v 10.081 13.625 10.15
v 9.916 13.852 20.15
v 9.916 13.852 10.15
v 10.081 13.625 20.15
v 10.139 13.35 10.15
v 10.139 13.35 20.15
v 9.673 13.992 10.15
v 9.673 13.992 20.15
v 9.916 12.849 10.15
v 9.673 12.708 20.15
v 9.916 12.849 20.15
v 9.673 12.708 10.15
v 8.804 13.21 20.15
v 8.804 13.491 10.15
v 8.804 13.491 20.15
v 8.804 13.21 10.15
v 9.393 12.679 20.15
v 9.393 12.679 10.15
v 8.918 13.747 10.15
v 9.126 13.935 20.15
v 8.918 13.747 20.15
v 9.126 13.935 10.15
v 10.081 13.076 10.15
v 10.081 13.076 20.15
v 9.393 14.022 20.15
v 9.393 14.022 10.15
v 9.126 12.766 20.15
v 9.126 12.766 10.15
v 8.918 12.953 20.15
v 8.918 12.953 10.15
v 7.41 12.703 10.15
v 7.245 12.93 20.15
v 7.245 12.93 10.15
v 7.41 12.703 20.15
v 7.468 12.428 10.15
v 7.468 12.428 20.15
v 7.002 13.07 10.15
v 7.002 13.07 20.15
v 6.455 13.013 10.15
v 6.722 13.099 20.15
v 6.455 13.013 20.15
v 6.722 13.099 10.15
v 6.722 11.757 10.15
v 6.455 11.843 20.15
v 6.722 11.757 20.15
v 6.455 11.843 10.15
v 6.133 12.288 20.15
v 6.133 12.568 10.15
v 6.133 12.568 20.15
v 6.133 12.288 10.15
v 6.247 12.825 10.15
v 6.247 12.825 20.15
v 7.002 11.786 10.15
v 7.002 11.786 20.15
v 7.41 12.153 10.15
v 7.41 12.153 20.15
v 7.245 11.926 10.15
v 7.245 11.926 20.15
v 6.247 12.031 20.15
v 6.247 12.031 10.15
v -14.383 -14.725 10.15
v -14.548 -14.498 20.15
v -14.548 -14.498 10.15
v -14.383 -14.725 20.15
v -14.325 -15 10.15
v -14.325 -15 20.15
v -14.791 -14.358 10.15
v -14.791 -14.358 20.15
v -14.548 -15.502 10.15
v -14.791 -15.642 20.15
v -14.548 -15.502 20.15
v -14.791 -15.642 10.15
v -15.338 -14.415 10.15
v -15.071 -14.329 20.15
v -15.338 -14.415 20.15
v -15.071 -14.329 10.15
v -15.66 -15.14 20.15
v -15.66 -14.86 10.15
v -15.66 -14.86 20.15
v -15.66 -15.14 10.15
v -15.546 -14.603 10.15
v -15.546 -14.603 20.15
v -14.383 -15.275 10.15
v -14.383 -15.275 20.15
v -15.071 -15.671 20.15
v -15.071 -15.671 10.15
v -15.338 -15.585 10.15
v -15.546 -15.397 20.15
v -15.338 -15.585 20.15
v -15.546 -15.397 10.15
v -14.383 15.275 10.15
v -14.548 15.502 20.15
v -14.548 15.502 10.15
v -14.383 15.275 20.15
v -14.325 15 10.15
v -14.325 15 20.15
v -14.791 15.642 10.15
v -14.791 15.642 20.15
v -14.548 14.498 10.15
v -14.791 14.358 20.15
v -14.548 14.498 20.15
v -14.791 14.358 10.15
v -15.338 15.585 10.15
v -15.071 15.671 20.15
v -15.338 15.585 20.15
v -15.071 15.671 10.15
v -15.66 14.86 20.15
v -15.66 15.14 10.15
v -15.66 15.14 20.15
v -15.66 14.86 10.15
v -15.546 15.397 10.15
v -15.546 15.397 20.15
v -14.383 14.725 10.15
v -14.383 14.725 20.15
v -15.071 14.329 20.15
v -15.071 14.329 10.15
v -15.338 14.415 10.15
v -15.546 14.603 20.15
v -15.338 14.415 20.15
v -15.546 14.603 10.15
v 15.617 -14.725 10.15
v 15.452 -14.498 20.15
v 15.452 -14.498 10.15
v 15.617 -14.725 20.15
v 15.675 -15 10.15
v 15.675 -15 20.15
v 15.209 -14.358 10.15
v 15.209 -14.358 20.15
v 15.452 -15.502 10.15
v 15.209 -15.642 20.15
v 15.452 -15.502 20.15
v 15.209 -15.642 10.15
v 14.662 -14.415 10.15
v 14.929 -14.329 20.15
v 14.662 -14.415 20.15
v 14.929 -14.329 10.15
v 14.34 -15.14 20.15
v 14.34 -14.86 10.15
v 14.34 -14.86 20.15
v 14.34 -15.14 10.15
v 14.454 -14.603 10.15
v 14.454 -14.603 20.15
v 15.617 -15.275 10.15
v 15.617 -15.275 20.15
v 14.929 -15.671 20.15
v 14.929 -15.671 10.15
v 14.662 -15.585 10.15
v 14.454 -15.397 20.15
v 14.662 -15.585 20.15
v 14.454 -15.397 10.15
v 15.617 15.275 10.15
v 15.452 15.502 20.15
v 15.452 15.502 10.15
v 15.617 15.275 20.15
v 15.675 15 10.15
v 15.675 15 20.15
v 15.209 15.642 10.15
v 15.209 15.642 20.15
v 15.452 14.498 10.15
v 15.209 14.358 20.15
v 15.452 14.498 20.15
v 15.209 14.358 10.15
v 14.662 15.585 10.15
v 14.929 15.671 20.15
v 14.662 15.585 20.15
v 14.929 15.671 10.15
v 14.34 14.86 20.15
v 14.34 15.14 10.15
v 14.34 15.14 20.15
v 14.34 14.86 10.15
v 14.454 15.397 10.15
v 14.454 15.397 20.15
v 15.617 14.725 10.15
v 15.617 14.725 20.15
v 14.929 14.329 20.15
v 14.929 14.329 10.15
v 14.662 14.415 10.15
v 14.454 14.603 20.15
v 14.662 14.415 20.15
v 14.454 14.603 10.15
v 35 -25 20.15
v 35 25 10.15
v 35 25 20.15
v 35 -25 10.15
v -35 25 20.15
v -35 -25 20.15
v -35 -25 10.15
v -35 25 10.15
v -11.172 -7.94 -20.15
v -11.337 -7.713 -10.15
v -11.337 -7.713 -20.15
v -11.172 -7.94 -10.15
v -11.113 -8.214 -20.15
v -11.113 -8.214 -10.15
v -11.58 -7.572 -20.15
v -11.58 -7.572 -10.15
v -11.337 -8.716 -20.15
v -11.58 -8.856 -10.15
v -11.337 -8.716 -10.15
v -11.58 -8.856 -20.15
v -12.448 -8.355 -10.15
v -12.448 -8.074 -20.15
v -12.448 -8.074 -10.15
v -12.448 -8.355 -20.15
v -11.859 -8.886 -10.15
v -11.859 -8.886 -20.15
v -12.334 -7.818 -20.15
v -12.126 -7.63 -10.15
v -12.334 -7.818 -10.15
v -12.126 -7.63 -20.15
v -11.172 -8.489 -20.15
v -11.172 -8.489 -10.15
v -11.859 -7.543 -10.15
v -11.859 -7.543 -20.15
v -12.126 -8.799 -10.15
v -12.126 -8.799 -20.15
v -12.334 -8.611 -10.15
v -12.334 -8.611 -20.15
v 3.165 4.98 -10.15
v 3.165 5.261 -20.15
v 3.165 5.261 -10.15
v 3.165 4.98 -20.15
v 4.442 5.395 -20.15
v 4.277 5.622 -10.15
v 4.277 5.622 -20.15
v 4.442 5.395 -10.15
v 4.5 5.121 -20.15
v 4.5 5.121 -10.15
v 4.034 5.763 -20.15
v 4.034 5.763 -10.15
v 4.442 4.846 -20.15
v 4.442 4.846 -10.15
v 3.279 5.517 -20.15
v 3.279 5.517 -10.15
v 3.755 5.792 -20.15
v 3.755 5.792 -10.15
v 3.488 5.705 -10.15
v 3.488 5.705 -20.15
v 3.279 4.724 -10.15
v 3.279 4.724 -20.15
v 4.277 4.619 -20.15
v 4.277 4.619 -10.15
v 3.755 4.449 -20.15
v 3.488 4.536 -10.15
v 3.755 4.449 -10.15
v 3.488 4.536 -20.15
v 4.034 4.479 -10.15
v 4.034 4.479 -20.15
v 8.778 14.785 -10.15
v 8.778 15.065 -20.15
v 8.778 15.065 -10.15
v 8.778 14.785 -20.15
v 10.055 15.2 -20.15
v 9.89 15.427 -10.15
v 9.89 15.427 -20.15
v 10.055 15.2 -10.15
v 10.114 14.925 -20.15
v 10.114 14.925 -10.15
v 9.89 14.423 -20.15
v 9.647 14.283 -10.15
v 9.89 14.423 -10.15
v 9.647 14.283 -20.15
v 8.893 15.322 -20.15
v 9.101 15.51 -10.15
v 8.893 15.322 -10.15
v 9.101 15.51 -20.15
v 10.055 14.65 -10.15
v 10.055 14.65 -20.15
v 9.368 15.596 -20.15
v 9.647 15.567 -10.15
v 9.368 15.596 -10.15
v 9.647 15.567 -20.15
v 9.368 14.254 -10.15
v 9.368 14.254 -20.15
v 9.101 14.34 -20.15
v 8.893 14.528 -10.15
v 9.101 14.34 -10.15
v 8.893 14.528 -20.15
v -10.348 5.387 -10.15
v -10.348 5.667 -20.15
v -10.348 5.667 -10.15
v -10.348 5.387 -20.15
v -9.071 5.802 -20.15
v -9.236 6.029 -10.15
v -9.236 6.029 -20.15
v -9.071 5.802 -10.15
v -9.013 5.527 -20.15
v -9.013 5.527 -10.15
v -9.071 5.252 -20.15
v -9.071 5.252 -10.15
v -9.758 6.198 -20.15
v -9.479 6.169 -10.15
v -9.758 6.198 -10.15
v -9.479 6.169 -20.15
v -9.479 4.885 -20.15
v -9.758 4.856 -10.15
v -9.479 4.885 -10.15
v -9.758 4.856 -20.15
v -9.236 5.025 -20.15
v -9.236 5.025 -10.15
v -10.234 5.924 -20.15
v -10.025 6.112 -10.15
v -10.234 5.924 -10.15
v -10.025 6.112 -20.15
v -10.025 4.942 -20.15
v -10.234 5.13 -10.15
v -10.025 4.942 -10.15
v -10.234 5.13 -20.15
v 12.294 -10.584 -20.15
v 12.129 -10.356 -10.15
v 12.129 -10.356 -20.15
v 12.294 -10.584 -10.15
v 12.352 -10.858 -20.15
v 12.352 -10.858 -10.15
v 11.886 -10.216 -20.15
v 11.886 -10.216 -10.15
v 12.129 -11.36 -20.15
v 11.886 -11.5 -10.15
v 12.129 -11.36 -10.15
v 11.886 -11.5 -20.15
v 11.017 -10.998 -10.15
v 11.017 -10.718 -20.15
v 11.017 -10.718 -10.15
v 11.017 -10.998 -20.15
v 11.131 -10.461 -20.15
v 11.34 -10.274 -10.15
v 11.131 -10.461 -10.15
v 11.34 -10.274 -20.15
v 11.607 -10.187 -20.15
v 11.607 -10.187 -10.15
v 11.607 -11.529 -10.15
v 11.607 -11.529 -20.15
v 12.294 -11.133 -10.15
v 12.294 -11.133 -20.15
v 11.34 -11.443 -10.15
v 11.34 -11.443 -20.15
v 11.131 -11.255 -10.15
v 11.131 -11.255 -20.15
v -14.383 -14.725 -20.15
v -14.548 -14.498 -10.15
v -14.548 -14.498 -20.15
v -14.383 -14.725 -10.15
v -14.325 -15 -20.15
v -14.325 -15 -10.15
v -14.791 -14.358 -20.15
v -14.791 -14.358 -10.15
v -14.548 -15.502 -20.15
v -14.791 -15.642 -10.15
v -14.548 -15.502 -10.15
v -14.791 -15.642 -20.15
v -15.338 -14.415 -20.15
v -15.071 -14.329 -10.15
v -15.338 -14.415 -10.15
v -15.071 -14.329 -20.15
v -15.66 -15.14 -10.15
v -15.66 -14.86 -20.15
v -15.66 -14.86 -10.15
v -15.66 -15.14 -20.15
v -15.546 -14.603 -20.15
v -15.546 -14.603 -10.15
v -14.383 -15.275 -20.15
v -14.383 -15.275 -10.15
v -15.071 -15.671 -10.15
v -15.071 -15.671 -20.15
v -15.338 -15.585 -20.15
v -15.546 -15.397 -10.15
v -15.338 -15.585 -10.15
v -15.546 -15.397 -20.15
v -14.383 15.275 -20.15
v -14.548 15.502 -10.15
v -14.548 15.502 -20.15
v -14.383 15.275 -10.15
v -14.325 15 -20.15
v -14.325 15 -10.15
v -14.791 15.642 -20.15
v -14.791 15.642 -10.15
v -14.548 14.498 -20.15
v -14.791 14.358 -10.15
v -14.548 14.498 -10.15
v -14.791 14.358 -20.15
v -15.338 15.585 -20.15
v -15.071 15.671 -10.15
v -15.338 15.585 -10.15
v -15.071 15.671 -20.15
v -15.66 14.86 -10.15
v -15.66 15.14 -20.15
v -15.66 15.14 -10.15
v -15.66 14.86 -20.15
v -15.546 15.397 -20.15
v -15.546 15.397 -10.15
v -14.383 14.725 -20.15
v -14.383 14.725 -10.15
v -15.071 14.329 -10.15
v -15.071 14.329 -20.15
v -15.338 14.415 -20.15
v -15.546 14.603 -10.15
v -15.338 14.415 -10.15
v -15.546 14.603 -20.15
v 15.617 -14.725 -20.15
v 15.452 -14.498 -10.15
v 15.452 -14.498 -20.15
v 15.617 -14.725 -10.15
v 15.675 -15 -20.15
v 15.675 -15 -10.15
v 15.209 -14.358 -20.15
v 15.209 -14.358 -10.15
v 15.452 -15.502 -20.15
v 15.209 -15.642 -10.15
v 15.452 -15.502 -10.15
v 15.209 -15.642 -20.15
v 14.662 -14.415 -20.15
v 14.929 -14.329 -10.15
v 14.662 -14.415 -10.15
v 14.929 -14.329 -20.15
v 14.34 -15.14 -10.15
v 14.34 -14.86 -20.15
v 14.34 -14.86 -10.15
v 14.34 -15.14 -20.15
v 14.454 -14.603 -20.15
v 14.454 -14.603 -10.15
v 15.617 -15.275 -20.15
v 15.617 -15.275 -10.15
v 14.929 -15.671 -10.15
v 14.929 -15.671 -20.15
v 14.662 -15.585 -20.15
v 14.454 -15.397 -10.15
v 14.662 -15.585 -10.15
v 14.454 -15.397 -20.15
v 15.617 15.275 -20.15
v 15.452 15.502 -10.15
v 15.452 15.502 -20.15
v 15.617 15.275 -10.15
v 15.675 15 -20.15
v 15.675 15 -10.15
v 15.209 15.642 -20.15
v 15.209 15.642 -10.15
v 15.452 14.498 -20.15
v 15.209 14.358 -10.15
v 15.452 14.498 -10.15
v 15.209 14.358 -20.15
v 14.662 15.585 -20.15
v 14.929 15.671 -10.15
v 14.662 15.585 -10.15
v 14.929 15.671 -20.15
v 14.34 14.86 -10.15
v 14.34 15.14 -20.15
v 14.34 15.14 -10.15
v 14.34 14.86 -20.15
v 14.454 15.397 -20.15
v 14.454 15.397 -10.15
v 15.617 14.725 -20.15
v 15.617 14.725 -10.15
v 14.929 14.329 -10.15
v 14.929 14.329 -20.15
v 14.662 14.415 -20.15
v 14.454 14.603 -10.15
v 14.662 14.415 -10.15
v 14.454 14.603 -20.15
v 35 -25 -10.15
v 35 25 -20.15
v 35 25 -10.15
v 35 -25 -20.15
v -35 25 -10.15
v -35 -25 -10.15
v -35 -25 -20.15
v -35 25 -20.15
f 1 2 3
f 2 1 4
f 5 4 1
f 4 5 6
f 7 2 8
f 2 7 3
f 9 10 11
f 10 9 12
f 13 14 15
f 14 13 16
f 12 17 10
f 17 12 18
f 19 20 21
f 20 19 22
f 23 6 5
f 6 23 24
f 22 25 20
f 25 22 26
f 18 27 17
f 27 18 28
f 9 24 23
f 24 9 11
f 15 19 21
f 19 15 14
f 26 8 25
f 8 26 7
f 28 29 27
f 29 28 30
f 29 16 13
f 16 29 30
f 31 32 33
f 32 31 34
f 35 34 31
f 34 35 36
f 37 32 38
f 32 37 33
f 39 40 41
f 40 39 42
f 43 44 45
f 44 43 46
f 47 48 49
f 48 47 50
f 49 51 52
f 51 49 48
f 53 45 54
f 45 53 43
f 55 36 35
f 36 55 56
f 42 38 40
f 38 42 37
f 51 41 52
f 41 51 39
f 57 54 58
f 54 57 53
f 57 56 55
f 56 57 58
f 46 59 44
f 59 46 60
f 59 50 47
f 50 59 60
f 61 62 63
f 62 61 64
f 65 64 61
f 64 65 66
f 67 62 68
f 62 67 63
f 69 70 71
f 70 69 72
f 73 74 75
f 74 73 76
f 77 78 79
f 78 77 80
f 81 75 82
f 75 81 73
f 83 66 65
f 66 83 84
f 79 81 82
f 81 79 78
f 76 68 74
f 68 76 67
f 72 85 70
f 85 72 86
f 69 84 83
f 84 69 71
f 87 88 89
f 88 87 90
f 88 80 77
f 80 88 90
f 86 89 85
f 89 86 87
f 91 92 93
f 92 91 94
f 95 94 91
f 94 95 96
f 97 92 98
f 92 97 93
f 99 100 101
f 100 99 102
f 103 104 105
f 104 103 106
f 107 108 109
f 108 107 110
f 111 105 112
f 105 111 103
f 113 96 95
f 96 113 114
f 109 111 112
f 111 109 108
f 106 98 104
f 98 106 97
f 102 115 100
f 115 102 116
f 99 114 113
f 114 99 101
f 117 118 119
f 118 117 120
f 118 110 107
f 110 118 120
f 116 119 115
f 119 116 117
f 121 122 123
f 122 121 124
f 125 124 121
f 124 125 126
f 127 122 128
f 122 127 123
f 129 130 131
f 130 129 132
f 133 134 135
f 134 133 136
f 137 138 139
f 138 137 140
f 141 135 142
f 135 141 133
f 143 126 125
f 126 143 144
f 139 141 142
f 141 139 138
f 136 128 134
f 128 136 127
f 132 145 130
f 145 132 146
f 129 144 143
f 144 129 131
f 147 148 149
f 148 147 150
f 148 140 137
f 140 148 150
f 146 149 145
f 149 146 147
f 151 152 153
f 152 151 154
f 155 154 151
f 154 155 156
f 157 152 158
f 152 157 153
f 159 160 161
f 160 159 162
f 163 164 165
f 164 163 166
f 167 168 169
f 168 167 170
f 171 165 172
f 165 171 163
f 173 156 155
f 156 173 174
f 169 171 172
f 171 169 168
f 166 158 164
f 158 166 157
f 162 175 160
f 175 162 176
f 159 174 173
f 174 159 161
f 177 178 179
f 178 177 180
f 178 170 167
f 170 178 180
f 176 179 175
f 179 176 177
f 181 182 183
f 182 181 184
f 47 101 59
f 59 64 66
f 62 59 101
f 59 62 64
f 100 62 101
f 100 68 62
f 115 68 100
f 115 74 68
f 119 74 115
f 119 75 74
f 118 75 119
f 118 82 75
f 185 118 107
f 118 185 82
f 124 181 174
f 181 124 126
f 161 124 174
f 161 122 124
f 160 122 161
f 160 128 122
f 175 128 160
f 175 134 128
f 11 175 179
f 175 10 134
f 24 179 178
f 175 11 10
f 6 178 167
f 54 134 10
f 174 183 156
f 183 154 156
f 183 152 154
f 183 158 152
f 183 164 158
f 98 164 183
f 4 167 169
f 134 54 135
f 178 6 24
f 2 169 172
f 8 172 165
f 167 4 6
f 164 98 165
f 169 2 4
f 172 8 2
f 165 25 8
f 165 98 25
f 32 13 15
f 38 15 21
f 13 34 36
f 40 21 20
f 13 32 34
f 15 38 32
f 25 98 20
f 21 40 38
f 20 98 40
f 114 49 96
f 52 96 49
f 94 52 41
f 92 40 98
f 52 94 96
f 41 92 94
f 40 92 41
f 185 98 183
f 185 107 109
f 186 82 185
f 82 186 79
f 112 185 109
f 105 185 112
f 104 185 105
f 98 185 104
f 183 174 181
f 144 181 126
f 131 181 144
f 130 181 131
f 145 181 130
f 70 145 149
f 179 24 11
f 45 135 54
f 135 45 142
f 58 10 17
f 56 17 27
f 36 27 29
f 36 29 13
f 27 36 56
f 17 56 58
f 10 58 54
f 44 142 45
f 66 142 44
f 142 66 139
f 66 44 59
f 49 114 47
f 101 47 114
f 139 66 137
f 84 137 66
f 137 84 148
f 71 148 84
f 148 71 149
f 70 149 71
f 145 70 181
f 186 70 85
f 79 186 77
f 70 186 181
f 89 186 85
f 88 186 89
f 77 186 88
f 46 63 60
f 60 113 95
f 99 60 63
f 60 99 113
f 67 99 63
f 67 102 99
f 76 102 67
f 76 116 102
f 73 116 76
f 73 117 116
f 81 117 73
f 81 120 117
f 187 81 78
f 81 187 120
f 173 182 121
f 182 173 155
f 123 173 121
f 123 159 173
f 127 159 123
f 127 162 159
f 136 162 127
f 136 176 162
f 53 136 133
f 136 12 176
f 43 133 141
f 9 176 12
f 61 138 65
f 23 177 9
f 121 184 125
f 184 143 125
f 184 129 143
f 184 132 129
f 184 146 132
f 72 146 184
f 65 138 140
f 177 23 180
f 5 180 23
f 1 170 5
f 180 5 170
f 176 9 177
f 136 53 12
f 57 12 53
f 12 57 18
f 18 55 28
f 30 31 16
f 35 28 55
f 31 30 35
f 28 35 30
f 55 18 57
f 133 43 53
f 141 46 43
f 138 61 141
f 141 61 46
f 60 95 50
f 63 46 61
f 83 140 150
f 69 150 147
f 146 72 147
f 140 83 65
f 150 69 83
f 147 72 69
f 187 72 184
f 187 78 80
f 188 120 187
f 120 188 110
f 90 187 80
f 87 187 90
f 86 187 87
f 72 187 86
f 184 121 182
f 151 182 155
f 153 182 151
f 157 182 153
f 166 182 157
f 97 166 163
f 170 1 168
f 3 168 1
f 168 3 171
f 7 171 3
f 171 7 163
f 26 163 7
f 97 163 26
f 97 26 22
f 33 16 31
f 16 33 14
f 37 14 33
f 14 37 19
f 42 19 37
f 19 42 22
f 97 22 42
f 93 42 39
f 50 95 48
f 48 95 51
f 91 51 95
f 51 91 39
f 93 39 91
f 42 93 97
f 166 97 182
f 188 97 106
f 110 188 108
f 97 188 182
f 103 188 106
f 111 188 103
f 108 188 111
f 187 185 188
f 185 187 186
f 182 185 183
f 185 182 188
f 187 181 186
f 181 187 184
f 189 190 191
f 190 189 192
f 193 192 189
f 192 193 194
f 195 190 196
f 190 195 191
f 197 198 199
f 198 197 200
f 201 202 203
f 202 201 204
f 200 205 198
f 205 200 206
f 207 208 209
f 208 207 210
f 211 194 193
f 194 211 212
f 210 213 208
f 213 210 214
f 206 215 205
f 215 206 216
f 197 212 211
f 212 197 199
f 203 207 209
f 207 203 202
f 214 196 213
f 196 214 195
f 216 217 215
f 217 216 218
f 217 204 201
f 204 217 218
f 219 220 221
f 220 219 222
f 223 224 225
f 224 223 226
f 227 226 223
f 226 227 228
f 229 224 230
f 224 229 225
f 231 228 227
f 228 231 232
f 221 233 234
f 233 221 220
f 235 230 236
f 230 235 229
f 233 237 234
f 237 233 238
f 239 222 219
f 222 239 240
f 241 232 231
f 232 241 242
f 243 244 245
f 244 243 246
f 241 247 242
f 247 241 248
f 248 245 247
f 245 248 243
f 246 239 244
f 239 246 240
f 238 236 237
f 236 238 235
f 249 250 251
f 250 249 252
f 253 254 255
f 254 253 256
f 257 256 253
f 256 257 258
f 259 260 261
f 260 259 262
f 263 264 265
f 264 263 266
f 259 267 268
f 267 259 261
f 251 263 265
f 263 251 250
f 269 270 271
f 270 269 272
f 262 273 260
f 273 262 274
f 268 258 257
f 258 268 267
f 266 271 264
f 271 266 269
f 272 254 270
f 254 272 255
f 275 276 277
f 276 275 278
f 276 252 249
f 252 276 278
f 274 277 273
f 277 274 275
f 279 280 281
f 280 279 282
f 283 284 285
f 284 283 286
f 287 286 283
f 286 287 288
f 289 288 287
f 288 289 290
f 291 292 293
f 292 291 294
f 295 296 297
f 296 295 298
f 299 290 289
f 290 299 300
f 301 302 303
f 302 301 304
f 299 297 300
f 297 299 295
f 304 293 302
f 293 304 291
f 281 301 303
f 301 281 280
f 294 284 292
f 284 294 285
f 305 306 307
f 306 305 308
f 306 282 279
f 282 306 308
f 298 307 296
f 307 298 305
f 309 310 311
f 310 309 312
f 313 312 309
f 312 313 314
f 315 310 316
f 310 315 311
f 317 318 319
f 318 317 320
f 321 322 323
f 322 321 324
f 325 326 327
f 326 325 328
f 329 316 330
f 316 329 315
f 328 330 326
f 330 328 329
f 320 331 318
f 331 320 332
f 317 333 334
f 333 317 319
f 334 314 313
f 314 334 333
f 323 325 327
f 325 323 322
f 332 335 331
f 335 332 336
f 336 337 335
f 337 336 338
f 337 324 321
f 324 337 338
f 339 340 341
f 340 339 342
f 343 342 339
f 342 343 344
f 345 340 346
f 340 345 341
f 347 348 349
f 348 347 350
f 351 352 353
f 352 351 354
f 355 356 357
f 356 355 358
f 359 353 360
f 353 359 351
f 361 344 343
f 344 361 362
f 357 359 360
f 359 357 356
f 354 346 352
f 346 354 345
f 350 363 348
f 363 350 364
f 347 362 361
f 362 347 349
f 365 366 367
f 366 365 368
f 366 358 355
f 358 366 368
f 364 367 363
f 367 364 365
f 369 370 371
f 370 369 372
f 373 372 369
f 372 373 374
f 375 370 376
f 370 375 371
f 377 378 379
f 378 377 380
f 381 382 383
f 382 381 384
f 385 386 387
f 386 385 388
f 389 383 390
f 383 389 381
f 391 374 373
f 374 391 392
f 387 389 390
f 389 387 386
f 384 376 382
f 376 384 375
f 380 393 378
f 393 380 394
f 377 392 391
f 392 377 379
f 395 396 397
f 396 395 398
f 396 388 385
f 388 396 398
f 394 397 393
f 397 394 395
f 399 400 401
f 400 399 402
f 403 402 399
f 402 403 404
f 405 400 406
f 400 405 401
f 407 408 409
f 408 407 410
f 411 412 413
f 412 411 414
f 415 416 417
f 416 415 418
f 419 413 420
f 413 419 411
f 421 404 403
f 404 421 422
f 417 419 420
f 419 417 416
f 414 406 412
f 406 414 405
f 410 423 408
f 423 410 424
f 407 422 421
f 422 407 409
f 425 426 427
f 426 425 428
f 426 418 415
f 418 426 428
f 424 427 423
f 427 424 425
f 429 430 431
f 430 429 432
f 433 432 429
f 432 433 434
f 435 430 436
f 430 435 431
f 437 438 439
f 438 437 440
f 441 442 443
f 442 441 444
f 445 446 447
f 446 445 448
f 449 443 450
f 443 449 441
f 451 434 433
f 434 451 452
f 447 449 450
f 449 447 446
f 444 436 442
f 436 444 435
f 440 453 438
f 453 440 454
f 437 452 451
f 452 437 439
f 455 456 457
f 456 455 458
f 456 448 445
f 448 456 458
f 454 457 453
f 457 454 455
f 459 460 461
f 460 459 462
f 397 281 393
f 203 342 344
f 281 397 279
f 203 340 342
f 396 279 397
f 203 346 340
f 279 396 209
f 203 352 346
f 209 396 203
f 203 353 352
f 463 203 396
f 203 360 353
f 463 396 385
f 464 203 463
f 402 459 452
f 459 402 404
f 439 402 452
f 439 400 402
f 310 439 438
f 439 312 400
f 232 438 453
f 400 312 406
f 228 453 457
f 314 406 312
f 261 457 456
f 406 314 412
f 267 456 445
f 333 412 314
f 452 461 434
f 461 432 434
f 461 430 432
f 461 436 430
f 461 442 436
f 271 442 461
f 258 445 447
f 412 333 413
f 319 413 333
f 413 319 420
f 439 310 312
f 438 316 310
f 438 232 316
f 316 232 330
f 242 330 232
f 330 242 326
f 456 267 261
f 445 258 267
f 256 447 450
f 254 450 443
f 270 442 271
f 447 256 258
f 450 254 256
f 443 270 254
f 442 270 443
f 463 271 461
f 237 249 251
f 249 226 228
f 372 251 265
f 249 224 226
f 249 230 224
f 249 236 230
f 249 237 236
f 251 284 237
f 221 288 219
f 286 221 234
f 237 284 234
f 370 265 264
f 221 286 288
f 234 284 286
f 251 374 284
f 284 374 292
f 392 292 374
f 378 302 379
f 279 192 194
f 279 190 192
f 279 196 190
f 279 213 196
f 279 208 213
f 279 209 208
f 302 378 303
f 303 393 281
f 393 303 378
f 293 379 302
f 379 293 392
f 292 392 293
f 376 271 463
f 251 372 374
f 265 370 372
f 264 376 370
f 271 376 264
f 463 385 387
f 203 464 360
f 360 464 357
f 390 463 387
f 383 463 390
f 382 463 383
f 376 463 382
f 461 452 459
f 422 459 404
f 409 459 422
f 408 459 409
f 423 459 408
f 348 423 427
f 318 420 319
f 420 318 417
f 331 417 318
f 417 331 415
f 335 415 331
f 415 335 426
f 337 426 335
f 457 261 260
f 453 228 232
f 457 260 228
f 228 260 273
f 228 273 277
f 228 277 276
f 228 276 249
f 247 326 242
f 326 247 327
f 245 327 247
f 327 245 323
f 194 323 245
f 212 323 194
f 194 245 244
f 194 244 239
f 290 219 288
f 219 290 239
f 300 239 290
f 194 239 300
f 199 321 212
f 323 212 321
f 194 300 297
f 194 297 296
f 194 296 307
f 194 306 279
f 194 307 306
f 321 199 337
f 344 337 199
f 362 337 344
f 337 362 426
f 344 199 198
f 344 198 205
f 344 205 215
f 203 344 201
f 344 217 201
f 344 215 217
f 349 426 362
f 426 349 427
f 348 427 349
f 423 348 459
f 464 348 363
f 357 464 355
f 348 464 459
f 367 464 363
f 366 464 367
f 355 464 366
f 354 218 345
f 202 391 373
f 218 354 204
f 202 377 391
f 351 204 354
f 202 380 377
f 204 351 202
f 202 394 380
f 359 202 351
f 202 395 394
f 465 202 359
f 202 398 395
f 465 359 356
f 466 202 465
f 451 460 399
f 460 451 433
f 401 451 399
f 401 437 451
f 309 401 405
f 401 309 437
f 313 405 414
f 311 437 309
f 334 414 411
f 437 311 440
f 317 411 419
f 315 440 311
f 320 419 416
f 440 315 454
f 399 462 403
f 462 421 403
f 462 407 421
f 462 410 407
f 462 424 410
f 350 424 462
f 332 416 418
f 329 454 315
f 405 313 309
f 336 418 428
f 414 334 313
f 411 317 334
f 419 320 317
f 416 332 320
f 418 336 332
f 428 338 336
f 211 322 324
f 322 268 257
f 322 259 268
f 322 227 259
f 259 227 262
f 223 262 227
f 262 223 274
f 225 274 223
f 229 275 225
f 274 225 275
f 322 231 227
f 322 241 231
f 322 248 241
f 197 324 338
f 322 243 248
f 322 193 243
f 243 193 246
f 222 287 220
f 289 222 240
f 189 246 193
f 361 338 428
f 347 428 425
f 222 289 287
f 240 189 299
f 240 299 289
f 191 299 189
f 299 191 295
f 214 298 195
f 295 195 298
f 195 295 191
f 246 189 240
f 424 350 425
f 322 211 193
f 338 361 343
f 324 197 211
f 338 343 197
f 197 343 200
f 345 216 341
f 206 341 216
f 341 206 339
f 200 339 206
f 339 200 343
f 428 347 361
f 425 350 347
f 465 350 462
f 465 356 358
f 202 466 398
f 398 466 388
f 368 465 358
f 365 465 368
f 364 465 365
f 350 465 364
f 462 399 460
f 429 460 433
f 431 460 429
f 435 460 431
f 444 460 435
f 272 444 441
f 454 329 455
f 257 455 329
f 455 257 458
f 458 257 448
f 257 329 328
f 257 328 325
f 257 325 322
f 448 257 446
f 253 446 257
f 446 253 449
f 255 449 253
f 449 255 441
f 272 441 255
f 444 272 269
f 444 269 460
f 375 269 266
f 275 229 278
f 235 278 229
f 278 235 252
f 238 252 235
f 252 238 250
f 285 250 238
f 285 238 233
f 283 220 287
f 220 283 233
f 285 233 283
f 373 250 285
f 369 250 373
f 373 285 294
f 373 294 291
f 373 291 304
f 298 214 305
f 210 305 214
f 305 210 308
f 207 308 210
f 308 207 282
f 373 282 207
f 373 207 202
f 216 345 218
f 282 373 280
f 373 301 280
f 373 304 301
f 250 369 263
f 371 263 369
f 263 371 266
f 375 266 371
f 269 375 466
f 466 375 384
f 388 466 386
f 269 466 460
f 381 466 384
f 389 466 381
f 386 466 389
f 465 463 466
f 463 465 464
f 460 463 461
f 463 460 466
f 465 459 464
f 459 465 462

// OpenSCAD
/*  This program is free software: you can redistribute it and/or modify
    it under the terms of the GNU General Public License as published by
    the Free Software Foundation, either version 3 of the License, or
    (at your option) any later version.

    This program is distributed in the hope that it will be useful,
    but WITHOUT ANY WARRANTY; without even the implied warranty of
    MERCHANTABILITY or FITNESS FOR A PARTICULAR PURPOSE.  See the
    GNU General Public License for more details.

    You should have received a copy of the GNU General Public License
    along with this program. If not, see <https://www.gnu.org/licenses/>.   
*/

/*
An OpenSCAD script to convert a csv file containing a pcb test point report - generated e.g. from Altium Designer, KiCAD, Eagle or any other PCB design software - into a 3D model of a holder for mounting test probes for electrical tests.

Documentation and the latest version of this script can be found at: https://github.com/5inf/TestPointReport2STL

*/

//////////////////////////////////////////////////////////
//////////////// CONFIGURE BELOW//////////////////////////
//////////////////////////////////////////////////////////

//data of testpoints
/* [test point data] */
testpointdata=[
/* paste testpoint data here */
["GND", "T13-1", [8.2118,11.7856,0], "Bottom", 0, "075-PRP259RS-S", "075-SDN250S"],
["+5.0V", "T1-1", [23.8252,25.1206,0], "Bottom", 0, "075-PRP259RS-S", "075-SDN250S"],
["NetJ1_1", "T2-1", [29.4386,34.925,0], "Bottom", 0, "075-PRP259RS-S", "075-SDN250S"],
["GND", "T3-1", [10.3124,25.527,0], "Bottom", 0, "075-PRP259RS-S", "075-SDN250S"],
["SDA", "T4-1", [29.464,33.3502,0], "Top", 0, "075-PRP259RS-S", "075-SDN250S"],
["SCL", "T5-1", [26.793,32.428,0], "Top", 0, "075-PRP259RS-S", "075-SDN250S"],
["-5.0V", "T6-1", [31.6774,9.1419,0], "Bottom", 0, "075-PRP259RS-S", "075-SDN250S"],
["", "M4", [5,5,0], "Both", 0, "", ""],
["", "M3", [5,35,0], "Both", 0, "", ""],
["", "M2", [35,5,0], "Both", 0, "", ""],
["", "M1", [35,35,0], "Both", 0, "", ""]
/* end of paste testpoint data here */
];

//Parameters for the simple rectangular testpoint holder block
/* [Simple] */
//build fixture for needles for top testpoints
buildtop=true; 
//build fixture for needles for top testpoints
buildbottom=true; 
//extra width of mounting sheet in x direction
borderx=20;         
//extra width of mounting sheet in y direction
bordery=10;         
//thickness of mounting block holding the test probes
sheetthickness=10;

//Advanced model generation
/* [Visual] */
//show the actual testpins
showpins=false; 
//the initial distance of the pins from the surface of the pcb
initialpindistance=1; 

//Generate mounting plates
drawmountingsystem=false;  

//include a second holder for the pcb top side
includetoppcbholder=false;

//load a pcb 3d model specified by pcb path below
showpcb = false;    
//path to loadable pcb file (note: OpenSCAD supports stl format only)
pcbpath="";         
//show a dummy pcb model
showpcbdummy = false; 
//show the test pad locations on the dummy pcb as a simple cylinder shape
showtestpads = false; //show the test pad locations on the dummy pcb as a simple cylinder shape
//thickness of the (dummy) PCB
pcbthickness=1.6;   

//Animation options
/* [Animation] */
//distance of movement of the pcb under test towards the bottom holder. The top holder moves twice as far.
movementdistance=5; 

/* [Hidden] */
//Data specific to the default QATech.com 075-SDN250S/075-PRP259RS-S test needles 
//minimum distance of test needle tip from where it is mounted
minpointheight=0;  
//maximum distance of test needle tip from where it is mounted
maxpointheight=6.35;  

//////////////////////////////////////////////////////////
/////////////// DO NOT EDIT BELOW ////////////////////////
//////////////////////////////////////////////////////////

timeoffset=initialpindistance/movementdistance;

span=maxpointheight-minpointheight;

pointstop=[for(v=testpointdata)if(v[3]!="Bottom")v];
//echo(pointstop);

pointsbottom=[for(v=testpointdata)if(v[3]!="Top")v];
//echo(pointsbottom);

maxx=max([for(v=testpointdata)v[2][0]]);
minx=min([for(v=testpointdata)v[2][0]]);
maxy=max([for(v=testpointdata)v[2][1]]);
miny=min([for(v=testpointdata)v[2][1]]);

maxtop=max([for(v=pointstop)v[2][2]]);
mintop=min([for(v=pointstop)v[2][2]]);
maxbottom=max([for(v=pointsbottom)v[2][2]]);
minbottom=min([for(v=pointsbottom)v[2][2]]);

maxdisttop=maxtop-mintop;
maxdistbottom=maxbottom-minbottom;

if(movementdistance>initialpindistance+span){
    echo ("ERROR: moving to far. Pins and setup might get damaged!");
}
if(movementdistance<initialpindistance+maxdisttop){
    echo ("ERROR: moving not far enough. Top pins might not all connect!");
}
if(movementdistance<initialpindistance+maxdistbottom){
    echo ("ERROR: moving not far enough. Bottom pins might not all connect!");
}

if(drawmountingsystem){
    //draw top block with interconnect pcb

    translate([0,0,0]){
        //WAMMountingTop(zpos=maxtop+span+2);
    }
    //draw top bcb holder (this holder is optional as one option to hold down the pcb.)
    if(includetoppcbholder){
    translate([0,0,0]){
        WAMMountingMiddle(zpos=+(-1.6+5)/2);
    }
}
    //draw bottom pcb holder
    translate([0,0,0]){
        WAMMountingMiddle(zpos=-(1.6+5)/2);
    }
    //draw bottom block with interconnect pcb
    //WAMMountingBottom(zpos=-maxbottom-span-9,movementdistance=movementdistance);
}


//center testpoints arround origin
translate([-(minx+maxx)/2,-(maxy+miny)/2,0]){
    
    //dummy PCB
    translate([0,0,0]){
        if(showpcbdummy){
            translate([minx-5,miny-5,-pcbthickness/2]){
                    color("Green",alpha=0.4)
                    cube([maxx-minx+10,maxy-miny+10,pcbthickness],center=false);
                }
        }
        //external pcb model
        if(showpcb){
            import(pcbpath);
        }
        //testpads
        if(showtestpads){
            union(){
                $fs=0.3;
            for(point=pointstop){
                color("Gold")
                translate([point[2][0],point[2][1],pcbthickness/2]){
                    difference(){
                        cylinder(d=point[4]+0.4,h=0.1);
                        translate([0,0,-1])cylinder(d=point[4],h=3);
                    }
                }
                }
            for(point=pointsbottom){
                color("Gold")
                translate([point[2][0],point[2][1],-pcbthickness/2-0.1]){
                    difference(){
                        cylinder(d=point[4]+0.4,h=0.1);
                        translate([0,0,-1])cylinder(d=point[4],h=3);
                    }
                }
                }
            }
        }
    }
    if(buildtop && !(pointstop==[])){
        if(maxdisttop>span){
            echo("ERROR: Span on top to high", span, maxdistbottom);
        }else{
            translate([0,0,0]){
        //the top holder and test pins
            translate([0,0,pcbthickness/2+initialpindistance])
            union(){
                difference(){
                    if(!drawmountingsystem){
                    translate([minx-borderx,miny-bordery,maxtop+span+2]){
                        //color("red",alpha=0.5)
               cube([maxx-minx+2*borderx,maxy-miny+2*bordery,sheetthickness],center=false);
                        }}else{
                    translate([+(minx+maxx)/2,+(maxy+miny)/2,0]){
                        WAMMountingTop(zpos=maxtop+span+2);                
                    }}
                    for(point=pointstop){
                        translate([point[2][0],point[2][1],0]){
                            pinhole(socket=point[6]);
                        }
                    }
                }

                if(showpins){
                    for(point=pointstop){
                        translate([point[2][0],point[2][1],point[2][2]]){
                            testpin(ontop=true,inset=point[2][2]+initialpindistance,probe=point[5],socket=point[6],movementdistance=movementdistance);
                        }
                    }
                }
            }
        }
    }
    }

    if(buildbottom && !(pointsbottom==[])){
        if(maxdistbottom>span){
            echo("ERROR: Span on bottom to high", span, maxdistbottom);
        }else{
            //the bottom holder and testpins
            translate([0,0,-pcbthickness/2-initialpindistance])
            union(){
                difference(){
                    if(!drawmountingsystem){
                    translate([minx-borderx,miny-bordery,-maxbottom-span-12]){
                        color("blue",alpha=0.5)
                        cube([maxx-minx+2*borderx,maxy-miny+2*bordery,sheetthickness],center=false);
                    }}else{
                    translate([+(minx+maxx)/2,+(maxy+miny)/2,0]){
                    WAMMountingBottom(zpos=-maxbottom-span-9,movementdistance=movementdistance);
                    }
                    }
                    for(point=pointsbottom){
                        translate([point[2][0],point[2][1],0]){
                            pinhole(socket=point[6]);
                        }
                    }
                }
                if(showpins){
                    for(point=pointsbottom){
                        translate([point[2][0],point[2][1],-point[2][2]])
                            testpin(ontop=false,inset=point[2][2]+initialpindistance,probe=point[5],socket=point[6],movementdistance=movementdistance);
                    }
                }
            }
        }
    }
}


/////////////////////////////////////
//models the complete test pin
module testpin(ontop=true,inset=0,probe="",socket="",inset=0,movementdistance=0){
    $fs=0.3;
    rotate([0,ontop?0:180,0]){
        probe(probe=probe,inset=inset,movementdistance=movementdistance);
        socket(socket=socket);
    }
}

//models the hole that gets drilled through the sheet
module pinhole(socket=""){
   $fs=0.3;
    if(socket=="050-SRB255P"){
       // QATech.com
       cylinder(h=1000,d=1.0,center=true);
   }else if(socket=="050-STB255P"){
       // QATech.com
       cylinder(h=1000,d=1.0,center=true);
   }else if(socket=="075-SDN250S"){
       // QATech.com socket 075-SDN250S
       cylinder(h=1000,d=1.35,center=true);
   }else if(socket=="075-PRP259RS-S"){
       //default: QATech.com socket 075-SDN250S
       cylinder(h=1000,d=1.35,center=true);
   }else{
       //default: QATech.com socket 075-SDN250S
       cylinder(h=1000,d=1.35,center=true);
   }   
}

module probe(probe="",inset=0,movementdistance=0){
   //Probe QATech.com 075-PRP259RS-S
    delay=inset/movementdistance;
    translate([0,0,0]){ 
       $fs=0.1;
       if(probe=="050-PTP2540S"){
           color("Gold")
           //tip part 1
           translate([0,0,0.53/2])sphere(d=0.53);
           //tip part 2
           color("Gold")
            translate([0,0,0.53/2])cylinder(h=2,d=0.53,center=false);
           //shaft 
           color("Gold")
           translate([0,0,2])cylinder(h=8,d=0.53,center=false);
        }else 
        if(probe=="050-PTP2541S"){
           color("Gold")
           //tip part 1
           translate([0,0,0])cylinder(h=2,d1=0,d2=0.53,center=false);
           //tip part 2
           //shaft 
           color("Gold")
           translate([0,0,2])cylinder(h=8,d=0.53,center=false);
        }else if(probe=="050-PRP2540S"){
           color("Gold")
           //tip part 1
           translate([0,0,0.53/2])sphere(d=0.53);
           color("Gold")
           //tip part 2
           translate([0,0,0.53/2])cylinder(h=2,d=0.53,center=false);
           //shaft 
           color("Gold")
           translate([0,0,2])cylinder(h=8,d=0.53,center=false);
        }else
        if(probe=="050-PRP2541S"){
           color("Gold")
           //tip part 1
           translate([0,0,0])cylinder(h=2,d1=0,d2=0.53,center=false);
           //tip part 2
           //shaft 
           color("Gold")
           translate([0,0,2])cylinder(h=8,d=0.53,center=false);
        }else if(probe=="075-PRP2501S"){
           color("Gold")
           //tip part 1
           translate([0,0,0])cylinder(h=1.27/2,d1=0,d2=1.17,center=false);
           //tip part 2
           color("Gold")
           translate([0,0,1.27/2])cylinder(h=1.27/2,d=1.17,center=false);
           //shaft 
           color("Gold")
           translate([0,0,1.27])cylinder(h=8,d=0.64,center=false);
       }else if(probe=="075-PRP2510S"){
           color("Gold")
           //tip part 1
           translate([0,0,0])cylinder(h=1.17,d=1.17,center=false);
           //tip part 2
           //shaft 
           color("Gold")
           translate([0,0,1.27])cylinder(h=8,d=0.64,center=false);
        }else if(probe=="075-PRP2520S"){
           color("Gold")
           //tip part 1
           translate([0,0,0])cylinder(h=2,d=0.64,center=false);
           //tip part 2
           //shaft 
           color("Gold")
           translate([0,0,1.27])cylinder(h=8,d=0.64,center=false);
       }else if(probe=="075-PRP2540S"){
           color("Gold")
           //tip part 1
           translate([0,0,0.64/2])sphere(d=0.64);
           //tip part 2
           color("Gold")
           translate([0,0,0.64/2])cylinder(h=2,d=0.64,center=false);
           //shaft 
           color("Gold")
           translate([0,0,2])cylinder(h=8,d=0.64,center=false); 
       }else if(probe=="075-PRP259RS-S"){
           color("Gold")
           //tip part 1
           //tip part 2
           translate([0,0,0])cylinder(h=2,d1=0,d2=0.64,center=false);
           //shaft 
           color("Gold")
           translate([0,0,2])cylinder(h=8,d=0.64,center=false);
       }else {//Default
           //tip part 1
           color("Blue")
           translate([0,0,-0.5])cylinder(h=0.5,d1=2,d2=3,center=false);
           //tip part 2
           color("Red")
           translate([0,0,0])cylinder(h=2,d1=3.5,d2=0.64,center=false);
           //shaft 
           color("Red")
           translate([0,0,2])cylinder(h=7.62,d=0.64,center=false);
       }
   }
}

module socket(socket=""){
   //Socket QATech.com 075-SDN250S 
   $fs=0.1;
   if(socket=="050-SRB255P"){
       color("Gray")
       // QATech.com
       translate([0,0,43.18-36.27])cylinder(h=40.41,d=0.95,center=false);
       translate([0,0,8+5.08])cylinder(h=1,d=1.0,center=false);
       color("blue")
       translate([0,0,8+7.37])cylinder(h=1,d=1.05,center=false);
       translate([0,0,8+11.71])cylinder(h=1,d=1.0,center=false);      
   }else if(socket=="050-STB255P"){
       color("Gray")
       // QATech.com
       translate([0,0,43.18-36.27])cylinder(h=31.83,d=0.95,center=false);
       translate([0,0,8+5.08])cylinder(h=1,d=1.0,center=false);
       color("fuchsia")
       translate([0,0,8+7.37])cylinder(h=1,d=1.05,center=false);
       translate([0,0,8+11.71])cylinder(h=1,d=1.0,center=false);      
   }else if(socket=="075-SDN250S"){
       // QATech.com 075-SDN250S
       color("Gray")
       translate([0,0,7.8])cylinder(h=29.72,d=1.021,center=false);
       color("yellow")
       translate([0,0,7.8+7.62])cylinder(h=1,d=1.46,center=false);      
   }else{
       //default: QATech.com 075-PRP259RS-S with socket 075-SDN250S
       color("red")
       translate([0,0,7.8])cylinder(h=29.72,d=1.021,center=false);
       color("red")
       translate([0,0,7.8+7.62])cylinder(h=1,d=1.46,center=false);
   }
}
///////////////////////////////////////////////////////

module WAMMountingTop(zpos=0){
    //WA-AP-100 pressure plate / Andruckplatte
    //TODO: correct hole positions
    translate([0,0,zpos+7]){
    difference(){
        color("White",alpha=0.2)
        cube([190,110,10], center=true);
        translate([90,-50,0])cylinder(d=1.6,h=10,center=true);
        translate([90,0,0])cylinder(d=1.6,h=10,center=true);
        translate([90,50,0])cylinder(d=1.6,h=10,center=true);
        translate([-90,-50,0])cylinder(d=1.6,h=10,center=true);
        translate([-90,0,0])cylinder(d=1.6,h=10,center=true);
        translate([-90,50,0])cylinder(d=1.6,h=10,center=true);
        translate([0,-20,0])cylinder(d=1.6,h=10,center=true);
        translate([0,20,0])cylinder(d=1.6,h=10,center=true);
    }
    //interconnect pcb
    translate([0,0,(10+1.6)/2])color("Green")cube([160,100,1.6], center=true); 
    // push rods  
    translate([-80,50,-22]){cylinder(d=8,h=22);}
    translate([80,50,-22]){cylinder(d=8,h=22);}
}
}

module WAMMountingMiddle(zpos=0){
    //WA-PAP-100 mounting plate / Prüflingsauflageplatte
    //TODO: correct hole positions
    //Comes with a dummy coutout as hole. Adjust this cutout according to the actual pcb outline
    translate([0,0,zpos+1.6])color("MediumSlateBlue",alpha=0.2)
    difference(){
        cube([190,110,5], center=true);
        //dummy pcb cutout
        translate([0,0,0])cube([38,38,5], center=true);
        translate([0,0,+2.5-1.6/2])cube([40.5,40.5,1.6], center=true);
        
        //mounting holes
        translate([80,50,0])cylinder(d=10,h=10,center=true);
        translate([-80,50,0])cylinder(d=10,h=10,center=true);
        
        translate([90,-5,0])cylinder(d=3,h=10,center=true);
        translate([90,-25,0])cylinder(d=3,h=10,center=true);
        translate([90,-45,0])cylinder(d=3,h=10,center=true);
        translate([-90,-5,0])cylinder(d=3,h=10,center=true);
        translate([-90,-25,0])cylinder(d=3,h=10,center=true);
        translate([-90,-45,0])cylinder(d=3,h=10,center=true);
        
        translate([90,20,0])cylinder(d=1.6,h=10,center=true);
        translate([90,10,0])cylinder(d=1.6,h=10,center=true);
        translate([90,0,0])cylinder(d=1.6,h=10,center=true);
        translate([90,-10,0])cylinder(d=1.6,h=10,center=true);
        translate([90,-20,0])cylinder(d=1.6,h=10,center=true);
        translate([90,-30,0])cylinder(d=1.6,h=10,center=true);
        translate([90,-40,0])cylinder(d=1.6,h=10,center=true);
        translate([90,-50,0])cylinder(d=1.6,h=10,center=true);
        translate([-90,20,0])cylinder(d=1.6,h=10,center=true);
        translate([-90,10,0])cylinder(d=1.6,h=10,center=true);
        translate([-90,0,0])cylinder(d=1.6,h=10,center=true);
        translate([-90,-10,0])cylinder(d=1.6,h=10,center=true);
        translate([-90,-20,0])cylinder(d=1.6,h=10,center=true);
        translate([-90,-30,0])cylinder(d=1.6,h=10,center=true);
        translate([-90,-40,0])cylinder(d=1.6,h=10,center=true);
        translate([-90,-50,0])cylinder(d=1.6,h=10,center=true);
    }
}

module WAMMountingBottom(zpos=0,movementdistance=0){
    //WA-M-1200 contact plate / Kontaktträgerplatte
    //TODO: correct hole positions
    translate([0,0,zpos]){
        difference(){
            color("Cornsilk")cube([190,110,10], center=true);
            translate([90,-5,0])cylinder(d=3,h=10,center=true);
            translate([90,-25,0])cylinder(d=3,h=10,center=true);
            translate([90,-45,0])cylinder(d=3,h=10,center=true);
            translate([-90,-5,0])cylinder(d=3,h=10,center=true);
            translate([-90,-25,0])cylinder(d=3,h=10,center=true);
            translate([-90,-45,0])cylinder(d=3,h=10,center=true);
       
            translate([90,20,0])cylinder(d=1.6,h=10,center=true);
            translate([90,10,0])cylinder(d=1.6,h=10,center=true);
            translate([90,0,0])cylinder(d=1.6,h=10,center=true);
            translate([90,-10,0])cylinder(d=1.6,h=10,center=true);
            translate([90,-20,0])cylinder(d=1.6,h=10,center=true);
            translate([90,-30,0])cylinder(d=1.6,h=10,center=true);
            translate([90,-40,0])cylinder(d=1.6,h=10,center=true);
            translate([90,-50,0])cylinder(d=1.6,h=10,center=true);
            translate([-90,20,0])cylinder(d=1.6,h=10,center=true);
            translate([-90,10,0])cylinder(d=1.6,h=10,center=true);
            translate([-90,0,0])cylinder(d=1.6,h=10,center=true);
            translate([-90,-10,0])cylinder(d=1.6,h=10,center=true);
            translate([-90,-20,0])cylinder(d=1.6,h=10,center=true);
            translate([-90,-30,0])cylinder(d=1.6,h=10,center=true);
            translate([-90,-40,0])cylinder(d=1.6,h=10,center=true);
            translate([-90,-50,0])cylinder(d=1.6,h=10,center=true);
            
            translate([-30,-50,0])cylinder(d=3.2,h=10,center=true);
            translate([30,-50,0])cylinder(d=3.2,h=10,center=true);
            translate([-30,50,0])cylinder(d=3.2,h=10,center=true);
            translate([30,50,0])cylinder(d=3.2,h=10,center=true);
        }
        //interconnect pcb
        translate([0,0,-(10+1.6)/2])color("Green")cube([160,100,1.6], center=true); 
        //guiding rods
        guidingRod([-90,-45,-2-(10+1.6)/2]);
        guidingRod([-90,45,-2-(10+1.6)/2]);
        guidingRod([90,-45,-2-(10+1.6)/2]);
        guidingRod([90,45,-2-(10+1.6)/2]);
        //bottom pcb holder distance spring rods
        distanceSpringRod([-88,-50,-1-(10+1.6)/2],movementdistance=movementdistance);
        distanceSpringRod([88,-50,-1-(10+1.6)/2],movementdistance=movementdistance);
        distanceSpringRod([88,50,-1-(10+1.6)/2],movementdistance=movementdistance);
        distanceSpringRod([-88,50,-1-(10+1.6)/2],movementdistance=movementdistance);
    }
}

module distanceSpringRod(pos=[0,0,0],movementdistance=0){
    translate(pos){
        color("DimGray")translate([0,0,-2])cylinder(d=3,h=15);
        translate([0,0,0]){
            color("Gold")translate([0,0,19.5])cylinder(d=3,h=2);
            color("Gold")translate([0,0,10])cylinder(d=1,h=10);
        }
    }
}
module guidingRod(pos=[0,0,0]){
    translate(pos){
        color("Black")translate([0,0,0])
            cylinder(d=3,h=25);
        }
}
